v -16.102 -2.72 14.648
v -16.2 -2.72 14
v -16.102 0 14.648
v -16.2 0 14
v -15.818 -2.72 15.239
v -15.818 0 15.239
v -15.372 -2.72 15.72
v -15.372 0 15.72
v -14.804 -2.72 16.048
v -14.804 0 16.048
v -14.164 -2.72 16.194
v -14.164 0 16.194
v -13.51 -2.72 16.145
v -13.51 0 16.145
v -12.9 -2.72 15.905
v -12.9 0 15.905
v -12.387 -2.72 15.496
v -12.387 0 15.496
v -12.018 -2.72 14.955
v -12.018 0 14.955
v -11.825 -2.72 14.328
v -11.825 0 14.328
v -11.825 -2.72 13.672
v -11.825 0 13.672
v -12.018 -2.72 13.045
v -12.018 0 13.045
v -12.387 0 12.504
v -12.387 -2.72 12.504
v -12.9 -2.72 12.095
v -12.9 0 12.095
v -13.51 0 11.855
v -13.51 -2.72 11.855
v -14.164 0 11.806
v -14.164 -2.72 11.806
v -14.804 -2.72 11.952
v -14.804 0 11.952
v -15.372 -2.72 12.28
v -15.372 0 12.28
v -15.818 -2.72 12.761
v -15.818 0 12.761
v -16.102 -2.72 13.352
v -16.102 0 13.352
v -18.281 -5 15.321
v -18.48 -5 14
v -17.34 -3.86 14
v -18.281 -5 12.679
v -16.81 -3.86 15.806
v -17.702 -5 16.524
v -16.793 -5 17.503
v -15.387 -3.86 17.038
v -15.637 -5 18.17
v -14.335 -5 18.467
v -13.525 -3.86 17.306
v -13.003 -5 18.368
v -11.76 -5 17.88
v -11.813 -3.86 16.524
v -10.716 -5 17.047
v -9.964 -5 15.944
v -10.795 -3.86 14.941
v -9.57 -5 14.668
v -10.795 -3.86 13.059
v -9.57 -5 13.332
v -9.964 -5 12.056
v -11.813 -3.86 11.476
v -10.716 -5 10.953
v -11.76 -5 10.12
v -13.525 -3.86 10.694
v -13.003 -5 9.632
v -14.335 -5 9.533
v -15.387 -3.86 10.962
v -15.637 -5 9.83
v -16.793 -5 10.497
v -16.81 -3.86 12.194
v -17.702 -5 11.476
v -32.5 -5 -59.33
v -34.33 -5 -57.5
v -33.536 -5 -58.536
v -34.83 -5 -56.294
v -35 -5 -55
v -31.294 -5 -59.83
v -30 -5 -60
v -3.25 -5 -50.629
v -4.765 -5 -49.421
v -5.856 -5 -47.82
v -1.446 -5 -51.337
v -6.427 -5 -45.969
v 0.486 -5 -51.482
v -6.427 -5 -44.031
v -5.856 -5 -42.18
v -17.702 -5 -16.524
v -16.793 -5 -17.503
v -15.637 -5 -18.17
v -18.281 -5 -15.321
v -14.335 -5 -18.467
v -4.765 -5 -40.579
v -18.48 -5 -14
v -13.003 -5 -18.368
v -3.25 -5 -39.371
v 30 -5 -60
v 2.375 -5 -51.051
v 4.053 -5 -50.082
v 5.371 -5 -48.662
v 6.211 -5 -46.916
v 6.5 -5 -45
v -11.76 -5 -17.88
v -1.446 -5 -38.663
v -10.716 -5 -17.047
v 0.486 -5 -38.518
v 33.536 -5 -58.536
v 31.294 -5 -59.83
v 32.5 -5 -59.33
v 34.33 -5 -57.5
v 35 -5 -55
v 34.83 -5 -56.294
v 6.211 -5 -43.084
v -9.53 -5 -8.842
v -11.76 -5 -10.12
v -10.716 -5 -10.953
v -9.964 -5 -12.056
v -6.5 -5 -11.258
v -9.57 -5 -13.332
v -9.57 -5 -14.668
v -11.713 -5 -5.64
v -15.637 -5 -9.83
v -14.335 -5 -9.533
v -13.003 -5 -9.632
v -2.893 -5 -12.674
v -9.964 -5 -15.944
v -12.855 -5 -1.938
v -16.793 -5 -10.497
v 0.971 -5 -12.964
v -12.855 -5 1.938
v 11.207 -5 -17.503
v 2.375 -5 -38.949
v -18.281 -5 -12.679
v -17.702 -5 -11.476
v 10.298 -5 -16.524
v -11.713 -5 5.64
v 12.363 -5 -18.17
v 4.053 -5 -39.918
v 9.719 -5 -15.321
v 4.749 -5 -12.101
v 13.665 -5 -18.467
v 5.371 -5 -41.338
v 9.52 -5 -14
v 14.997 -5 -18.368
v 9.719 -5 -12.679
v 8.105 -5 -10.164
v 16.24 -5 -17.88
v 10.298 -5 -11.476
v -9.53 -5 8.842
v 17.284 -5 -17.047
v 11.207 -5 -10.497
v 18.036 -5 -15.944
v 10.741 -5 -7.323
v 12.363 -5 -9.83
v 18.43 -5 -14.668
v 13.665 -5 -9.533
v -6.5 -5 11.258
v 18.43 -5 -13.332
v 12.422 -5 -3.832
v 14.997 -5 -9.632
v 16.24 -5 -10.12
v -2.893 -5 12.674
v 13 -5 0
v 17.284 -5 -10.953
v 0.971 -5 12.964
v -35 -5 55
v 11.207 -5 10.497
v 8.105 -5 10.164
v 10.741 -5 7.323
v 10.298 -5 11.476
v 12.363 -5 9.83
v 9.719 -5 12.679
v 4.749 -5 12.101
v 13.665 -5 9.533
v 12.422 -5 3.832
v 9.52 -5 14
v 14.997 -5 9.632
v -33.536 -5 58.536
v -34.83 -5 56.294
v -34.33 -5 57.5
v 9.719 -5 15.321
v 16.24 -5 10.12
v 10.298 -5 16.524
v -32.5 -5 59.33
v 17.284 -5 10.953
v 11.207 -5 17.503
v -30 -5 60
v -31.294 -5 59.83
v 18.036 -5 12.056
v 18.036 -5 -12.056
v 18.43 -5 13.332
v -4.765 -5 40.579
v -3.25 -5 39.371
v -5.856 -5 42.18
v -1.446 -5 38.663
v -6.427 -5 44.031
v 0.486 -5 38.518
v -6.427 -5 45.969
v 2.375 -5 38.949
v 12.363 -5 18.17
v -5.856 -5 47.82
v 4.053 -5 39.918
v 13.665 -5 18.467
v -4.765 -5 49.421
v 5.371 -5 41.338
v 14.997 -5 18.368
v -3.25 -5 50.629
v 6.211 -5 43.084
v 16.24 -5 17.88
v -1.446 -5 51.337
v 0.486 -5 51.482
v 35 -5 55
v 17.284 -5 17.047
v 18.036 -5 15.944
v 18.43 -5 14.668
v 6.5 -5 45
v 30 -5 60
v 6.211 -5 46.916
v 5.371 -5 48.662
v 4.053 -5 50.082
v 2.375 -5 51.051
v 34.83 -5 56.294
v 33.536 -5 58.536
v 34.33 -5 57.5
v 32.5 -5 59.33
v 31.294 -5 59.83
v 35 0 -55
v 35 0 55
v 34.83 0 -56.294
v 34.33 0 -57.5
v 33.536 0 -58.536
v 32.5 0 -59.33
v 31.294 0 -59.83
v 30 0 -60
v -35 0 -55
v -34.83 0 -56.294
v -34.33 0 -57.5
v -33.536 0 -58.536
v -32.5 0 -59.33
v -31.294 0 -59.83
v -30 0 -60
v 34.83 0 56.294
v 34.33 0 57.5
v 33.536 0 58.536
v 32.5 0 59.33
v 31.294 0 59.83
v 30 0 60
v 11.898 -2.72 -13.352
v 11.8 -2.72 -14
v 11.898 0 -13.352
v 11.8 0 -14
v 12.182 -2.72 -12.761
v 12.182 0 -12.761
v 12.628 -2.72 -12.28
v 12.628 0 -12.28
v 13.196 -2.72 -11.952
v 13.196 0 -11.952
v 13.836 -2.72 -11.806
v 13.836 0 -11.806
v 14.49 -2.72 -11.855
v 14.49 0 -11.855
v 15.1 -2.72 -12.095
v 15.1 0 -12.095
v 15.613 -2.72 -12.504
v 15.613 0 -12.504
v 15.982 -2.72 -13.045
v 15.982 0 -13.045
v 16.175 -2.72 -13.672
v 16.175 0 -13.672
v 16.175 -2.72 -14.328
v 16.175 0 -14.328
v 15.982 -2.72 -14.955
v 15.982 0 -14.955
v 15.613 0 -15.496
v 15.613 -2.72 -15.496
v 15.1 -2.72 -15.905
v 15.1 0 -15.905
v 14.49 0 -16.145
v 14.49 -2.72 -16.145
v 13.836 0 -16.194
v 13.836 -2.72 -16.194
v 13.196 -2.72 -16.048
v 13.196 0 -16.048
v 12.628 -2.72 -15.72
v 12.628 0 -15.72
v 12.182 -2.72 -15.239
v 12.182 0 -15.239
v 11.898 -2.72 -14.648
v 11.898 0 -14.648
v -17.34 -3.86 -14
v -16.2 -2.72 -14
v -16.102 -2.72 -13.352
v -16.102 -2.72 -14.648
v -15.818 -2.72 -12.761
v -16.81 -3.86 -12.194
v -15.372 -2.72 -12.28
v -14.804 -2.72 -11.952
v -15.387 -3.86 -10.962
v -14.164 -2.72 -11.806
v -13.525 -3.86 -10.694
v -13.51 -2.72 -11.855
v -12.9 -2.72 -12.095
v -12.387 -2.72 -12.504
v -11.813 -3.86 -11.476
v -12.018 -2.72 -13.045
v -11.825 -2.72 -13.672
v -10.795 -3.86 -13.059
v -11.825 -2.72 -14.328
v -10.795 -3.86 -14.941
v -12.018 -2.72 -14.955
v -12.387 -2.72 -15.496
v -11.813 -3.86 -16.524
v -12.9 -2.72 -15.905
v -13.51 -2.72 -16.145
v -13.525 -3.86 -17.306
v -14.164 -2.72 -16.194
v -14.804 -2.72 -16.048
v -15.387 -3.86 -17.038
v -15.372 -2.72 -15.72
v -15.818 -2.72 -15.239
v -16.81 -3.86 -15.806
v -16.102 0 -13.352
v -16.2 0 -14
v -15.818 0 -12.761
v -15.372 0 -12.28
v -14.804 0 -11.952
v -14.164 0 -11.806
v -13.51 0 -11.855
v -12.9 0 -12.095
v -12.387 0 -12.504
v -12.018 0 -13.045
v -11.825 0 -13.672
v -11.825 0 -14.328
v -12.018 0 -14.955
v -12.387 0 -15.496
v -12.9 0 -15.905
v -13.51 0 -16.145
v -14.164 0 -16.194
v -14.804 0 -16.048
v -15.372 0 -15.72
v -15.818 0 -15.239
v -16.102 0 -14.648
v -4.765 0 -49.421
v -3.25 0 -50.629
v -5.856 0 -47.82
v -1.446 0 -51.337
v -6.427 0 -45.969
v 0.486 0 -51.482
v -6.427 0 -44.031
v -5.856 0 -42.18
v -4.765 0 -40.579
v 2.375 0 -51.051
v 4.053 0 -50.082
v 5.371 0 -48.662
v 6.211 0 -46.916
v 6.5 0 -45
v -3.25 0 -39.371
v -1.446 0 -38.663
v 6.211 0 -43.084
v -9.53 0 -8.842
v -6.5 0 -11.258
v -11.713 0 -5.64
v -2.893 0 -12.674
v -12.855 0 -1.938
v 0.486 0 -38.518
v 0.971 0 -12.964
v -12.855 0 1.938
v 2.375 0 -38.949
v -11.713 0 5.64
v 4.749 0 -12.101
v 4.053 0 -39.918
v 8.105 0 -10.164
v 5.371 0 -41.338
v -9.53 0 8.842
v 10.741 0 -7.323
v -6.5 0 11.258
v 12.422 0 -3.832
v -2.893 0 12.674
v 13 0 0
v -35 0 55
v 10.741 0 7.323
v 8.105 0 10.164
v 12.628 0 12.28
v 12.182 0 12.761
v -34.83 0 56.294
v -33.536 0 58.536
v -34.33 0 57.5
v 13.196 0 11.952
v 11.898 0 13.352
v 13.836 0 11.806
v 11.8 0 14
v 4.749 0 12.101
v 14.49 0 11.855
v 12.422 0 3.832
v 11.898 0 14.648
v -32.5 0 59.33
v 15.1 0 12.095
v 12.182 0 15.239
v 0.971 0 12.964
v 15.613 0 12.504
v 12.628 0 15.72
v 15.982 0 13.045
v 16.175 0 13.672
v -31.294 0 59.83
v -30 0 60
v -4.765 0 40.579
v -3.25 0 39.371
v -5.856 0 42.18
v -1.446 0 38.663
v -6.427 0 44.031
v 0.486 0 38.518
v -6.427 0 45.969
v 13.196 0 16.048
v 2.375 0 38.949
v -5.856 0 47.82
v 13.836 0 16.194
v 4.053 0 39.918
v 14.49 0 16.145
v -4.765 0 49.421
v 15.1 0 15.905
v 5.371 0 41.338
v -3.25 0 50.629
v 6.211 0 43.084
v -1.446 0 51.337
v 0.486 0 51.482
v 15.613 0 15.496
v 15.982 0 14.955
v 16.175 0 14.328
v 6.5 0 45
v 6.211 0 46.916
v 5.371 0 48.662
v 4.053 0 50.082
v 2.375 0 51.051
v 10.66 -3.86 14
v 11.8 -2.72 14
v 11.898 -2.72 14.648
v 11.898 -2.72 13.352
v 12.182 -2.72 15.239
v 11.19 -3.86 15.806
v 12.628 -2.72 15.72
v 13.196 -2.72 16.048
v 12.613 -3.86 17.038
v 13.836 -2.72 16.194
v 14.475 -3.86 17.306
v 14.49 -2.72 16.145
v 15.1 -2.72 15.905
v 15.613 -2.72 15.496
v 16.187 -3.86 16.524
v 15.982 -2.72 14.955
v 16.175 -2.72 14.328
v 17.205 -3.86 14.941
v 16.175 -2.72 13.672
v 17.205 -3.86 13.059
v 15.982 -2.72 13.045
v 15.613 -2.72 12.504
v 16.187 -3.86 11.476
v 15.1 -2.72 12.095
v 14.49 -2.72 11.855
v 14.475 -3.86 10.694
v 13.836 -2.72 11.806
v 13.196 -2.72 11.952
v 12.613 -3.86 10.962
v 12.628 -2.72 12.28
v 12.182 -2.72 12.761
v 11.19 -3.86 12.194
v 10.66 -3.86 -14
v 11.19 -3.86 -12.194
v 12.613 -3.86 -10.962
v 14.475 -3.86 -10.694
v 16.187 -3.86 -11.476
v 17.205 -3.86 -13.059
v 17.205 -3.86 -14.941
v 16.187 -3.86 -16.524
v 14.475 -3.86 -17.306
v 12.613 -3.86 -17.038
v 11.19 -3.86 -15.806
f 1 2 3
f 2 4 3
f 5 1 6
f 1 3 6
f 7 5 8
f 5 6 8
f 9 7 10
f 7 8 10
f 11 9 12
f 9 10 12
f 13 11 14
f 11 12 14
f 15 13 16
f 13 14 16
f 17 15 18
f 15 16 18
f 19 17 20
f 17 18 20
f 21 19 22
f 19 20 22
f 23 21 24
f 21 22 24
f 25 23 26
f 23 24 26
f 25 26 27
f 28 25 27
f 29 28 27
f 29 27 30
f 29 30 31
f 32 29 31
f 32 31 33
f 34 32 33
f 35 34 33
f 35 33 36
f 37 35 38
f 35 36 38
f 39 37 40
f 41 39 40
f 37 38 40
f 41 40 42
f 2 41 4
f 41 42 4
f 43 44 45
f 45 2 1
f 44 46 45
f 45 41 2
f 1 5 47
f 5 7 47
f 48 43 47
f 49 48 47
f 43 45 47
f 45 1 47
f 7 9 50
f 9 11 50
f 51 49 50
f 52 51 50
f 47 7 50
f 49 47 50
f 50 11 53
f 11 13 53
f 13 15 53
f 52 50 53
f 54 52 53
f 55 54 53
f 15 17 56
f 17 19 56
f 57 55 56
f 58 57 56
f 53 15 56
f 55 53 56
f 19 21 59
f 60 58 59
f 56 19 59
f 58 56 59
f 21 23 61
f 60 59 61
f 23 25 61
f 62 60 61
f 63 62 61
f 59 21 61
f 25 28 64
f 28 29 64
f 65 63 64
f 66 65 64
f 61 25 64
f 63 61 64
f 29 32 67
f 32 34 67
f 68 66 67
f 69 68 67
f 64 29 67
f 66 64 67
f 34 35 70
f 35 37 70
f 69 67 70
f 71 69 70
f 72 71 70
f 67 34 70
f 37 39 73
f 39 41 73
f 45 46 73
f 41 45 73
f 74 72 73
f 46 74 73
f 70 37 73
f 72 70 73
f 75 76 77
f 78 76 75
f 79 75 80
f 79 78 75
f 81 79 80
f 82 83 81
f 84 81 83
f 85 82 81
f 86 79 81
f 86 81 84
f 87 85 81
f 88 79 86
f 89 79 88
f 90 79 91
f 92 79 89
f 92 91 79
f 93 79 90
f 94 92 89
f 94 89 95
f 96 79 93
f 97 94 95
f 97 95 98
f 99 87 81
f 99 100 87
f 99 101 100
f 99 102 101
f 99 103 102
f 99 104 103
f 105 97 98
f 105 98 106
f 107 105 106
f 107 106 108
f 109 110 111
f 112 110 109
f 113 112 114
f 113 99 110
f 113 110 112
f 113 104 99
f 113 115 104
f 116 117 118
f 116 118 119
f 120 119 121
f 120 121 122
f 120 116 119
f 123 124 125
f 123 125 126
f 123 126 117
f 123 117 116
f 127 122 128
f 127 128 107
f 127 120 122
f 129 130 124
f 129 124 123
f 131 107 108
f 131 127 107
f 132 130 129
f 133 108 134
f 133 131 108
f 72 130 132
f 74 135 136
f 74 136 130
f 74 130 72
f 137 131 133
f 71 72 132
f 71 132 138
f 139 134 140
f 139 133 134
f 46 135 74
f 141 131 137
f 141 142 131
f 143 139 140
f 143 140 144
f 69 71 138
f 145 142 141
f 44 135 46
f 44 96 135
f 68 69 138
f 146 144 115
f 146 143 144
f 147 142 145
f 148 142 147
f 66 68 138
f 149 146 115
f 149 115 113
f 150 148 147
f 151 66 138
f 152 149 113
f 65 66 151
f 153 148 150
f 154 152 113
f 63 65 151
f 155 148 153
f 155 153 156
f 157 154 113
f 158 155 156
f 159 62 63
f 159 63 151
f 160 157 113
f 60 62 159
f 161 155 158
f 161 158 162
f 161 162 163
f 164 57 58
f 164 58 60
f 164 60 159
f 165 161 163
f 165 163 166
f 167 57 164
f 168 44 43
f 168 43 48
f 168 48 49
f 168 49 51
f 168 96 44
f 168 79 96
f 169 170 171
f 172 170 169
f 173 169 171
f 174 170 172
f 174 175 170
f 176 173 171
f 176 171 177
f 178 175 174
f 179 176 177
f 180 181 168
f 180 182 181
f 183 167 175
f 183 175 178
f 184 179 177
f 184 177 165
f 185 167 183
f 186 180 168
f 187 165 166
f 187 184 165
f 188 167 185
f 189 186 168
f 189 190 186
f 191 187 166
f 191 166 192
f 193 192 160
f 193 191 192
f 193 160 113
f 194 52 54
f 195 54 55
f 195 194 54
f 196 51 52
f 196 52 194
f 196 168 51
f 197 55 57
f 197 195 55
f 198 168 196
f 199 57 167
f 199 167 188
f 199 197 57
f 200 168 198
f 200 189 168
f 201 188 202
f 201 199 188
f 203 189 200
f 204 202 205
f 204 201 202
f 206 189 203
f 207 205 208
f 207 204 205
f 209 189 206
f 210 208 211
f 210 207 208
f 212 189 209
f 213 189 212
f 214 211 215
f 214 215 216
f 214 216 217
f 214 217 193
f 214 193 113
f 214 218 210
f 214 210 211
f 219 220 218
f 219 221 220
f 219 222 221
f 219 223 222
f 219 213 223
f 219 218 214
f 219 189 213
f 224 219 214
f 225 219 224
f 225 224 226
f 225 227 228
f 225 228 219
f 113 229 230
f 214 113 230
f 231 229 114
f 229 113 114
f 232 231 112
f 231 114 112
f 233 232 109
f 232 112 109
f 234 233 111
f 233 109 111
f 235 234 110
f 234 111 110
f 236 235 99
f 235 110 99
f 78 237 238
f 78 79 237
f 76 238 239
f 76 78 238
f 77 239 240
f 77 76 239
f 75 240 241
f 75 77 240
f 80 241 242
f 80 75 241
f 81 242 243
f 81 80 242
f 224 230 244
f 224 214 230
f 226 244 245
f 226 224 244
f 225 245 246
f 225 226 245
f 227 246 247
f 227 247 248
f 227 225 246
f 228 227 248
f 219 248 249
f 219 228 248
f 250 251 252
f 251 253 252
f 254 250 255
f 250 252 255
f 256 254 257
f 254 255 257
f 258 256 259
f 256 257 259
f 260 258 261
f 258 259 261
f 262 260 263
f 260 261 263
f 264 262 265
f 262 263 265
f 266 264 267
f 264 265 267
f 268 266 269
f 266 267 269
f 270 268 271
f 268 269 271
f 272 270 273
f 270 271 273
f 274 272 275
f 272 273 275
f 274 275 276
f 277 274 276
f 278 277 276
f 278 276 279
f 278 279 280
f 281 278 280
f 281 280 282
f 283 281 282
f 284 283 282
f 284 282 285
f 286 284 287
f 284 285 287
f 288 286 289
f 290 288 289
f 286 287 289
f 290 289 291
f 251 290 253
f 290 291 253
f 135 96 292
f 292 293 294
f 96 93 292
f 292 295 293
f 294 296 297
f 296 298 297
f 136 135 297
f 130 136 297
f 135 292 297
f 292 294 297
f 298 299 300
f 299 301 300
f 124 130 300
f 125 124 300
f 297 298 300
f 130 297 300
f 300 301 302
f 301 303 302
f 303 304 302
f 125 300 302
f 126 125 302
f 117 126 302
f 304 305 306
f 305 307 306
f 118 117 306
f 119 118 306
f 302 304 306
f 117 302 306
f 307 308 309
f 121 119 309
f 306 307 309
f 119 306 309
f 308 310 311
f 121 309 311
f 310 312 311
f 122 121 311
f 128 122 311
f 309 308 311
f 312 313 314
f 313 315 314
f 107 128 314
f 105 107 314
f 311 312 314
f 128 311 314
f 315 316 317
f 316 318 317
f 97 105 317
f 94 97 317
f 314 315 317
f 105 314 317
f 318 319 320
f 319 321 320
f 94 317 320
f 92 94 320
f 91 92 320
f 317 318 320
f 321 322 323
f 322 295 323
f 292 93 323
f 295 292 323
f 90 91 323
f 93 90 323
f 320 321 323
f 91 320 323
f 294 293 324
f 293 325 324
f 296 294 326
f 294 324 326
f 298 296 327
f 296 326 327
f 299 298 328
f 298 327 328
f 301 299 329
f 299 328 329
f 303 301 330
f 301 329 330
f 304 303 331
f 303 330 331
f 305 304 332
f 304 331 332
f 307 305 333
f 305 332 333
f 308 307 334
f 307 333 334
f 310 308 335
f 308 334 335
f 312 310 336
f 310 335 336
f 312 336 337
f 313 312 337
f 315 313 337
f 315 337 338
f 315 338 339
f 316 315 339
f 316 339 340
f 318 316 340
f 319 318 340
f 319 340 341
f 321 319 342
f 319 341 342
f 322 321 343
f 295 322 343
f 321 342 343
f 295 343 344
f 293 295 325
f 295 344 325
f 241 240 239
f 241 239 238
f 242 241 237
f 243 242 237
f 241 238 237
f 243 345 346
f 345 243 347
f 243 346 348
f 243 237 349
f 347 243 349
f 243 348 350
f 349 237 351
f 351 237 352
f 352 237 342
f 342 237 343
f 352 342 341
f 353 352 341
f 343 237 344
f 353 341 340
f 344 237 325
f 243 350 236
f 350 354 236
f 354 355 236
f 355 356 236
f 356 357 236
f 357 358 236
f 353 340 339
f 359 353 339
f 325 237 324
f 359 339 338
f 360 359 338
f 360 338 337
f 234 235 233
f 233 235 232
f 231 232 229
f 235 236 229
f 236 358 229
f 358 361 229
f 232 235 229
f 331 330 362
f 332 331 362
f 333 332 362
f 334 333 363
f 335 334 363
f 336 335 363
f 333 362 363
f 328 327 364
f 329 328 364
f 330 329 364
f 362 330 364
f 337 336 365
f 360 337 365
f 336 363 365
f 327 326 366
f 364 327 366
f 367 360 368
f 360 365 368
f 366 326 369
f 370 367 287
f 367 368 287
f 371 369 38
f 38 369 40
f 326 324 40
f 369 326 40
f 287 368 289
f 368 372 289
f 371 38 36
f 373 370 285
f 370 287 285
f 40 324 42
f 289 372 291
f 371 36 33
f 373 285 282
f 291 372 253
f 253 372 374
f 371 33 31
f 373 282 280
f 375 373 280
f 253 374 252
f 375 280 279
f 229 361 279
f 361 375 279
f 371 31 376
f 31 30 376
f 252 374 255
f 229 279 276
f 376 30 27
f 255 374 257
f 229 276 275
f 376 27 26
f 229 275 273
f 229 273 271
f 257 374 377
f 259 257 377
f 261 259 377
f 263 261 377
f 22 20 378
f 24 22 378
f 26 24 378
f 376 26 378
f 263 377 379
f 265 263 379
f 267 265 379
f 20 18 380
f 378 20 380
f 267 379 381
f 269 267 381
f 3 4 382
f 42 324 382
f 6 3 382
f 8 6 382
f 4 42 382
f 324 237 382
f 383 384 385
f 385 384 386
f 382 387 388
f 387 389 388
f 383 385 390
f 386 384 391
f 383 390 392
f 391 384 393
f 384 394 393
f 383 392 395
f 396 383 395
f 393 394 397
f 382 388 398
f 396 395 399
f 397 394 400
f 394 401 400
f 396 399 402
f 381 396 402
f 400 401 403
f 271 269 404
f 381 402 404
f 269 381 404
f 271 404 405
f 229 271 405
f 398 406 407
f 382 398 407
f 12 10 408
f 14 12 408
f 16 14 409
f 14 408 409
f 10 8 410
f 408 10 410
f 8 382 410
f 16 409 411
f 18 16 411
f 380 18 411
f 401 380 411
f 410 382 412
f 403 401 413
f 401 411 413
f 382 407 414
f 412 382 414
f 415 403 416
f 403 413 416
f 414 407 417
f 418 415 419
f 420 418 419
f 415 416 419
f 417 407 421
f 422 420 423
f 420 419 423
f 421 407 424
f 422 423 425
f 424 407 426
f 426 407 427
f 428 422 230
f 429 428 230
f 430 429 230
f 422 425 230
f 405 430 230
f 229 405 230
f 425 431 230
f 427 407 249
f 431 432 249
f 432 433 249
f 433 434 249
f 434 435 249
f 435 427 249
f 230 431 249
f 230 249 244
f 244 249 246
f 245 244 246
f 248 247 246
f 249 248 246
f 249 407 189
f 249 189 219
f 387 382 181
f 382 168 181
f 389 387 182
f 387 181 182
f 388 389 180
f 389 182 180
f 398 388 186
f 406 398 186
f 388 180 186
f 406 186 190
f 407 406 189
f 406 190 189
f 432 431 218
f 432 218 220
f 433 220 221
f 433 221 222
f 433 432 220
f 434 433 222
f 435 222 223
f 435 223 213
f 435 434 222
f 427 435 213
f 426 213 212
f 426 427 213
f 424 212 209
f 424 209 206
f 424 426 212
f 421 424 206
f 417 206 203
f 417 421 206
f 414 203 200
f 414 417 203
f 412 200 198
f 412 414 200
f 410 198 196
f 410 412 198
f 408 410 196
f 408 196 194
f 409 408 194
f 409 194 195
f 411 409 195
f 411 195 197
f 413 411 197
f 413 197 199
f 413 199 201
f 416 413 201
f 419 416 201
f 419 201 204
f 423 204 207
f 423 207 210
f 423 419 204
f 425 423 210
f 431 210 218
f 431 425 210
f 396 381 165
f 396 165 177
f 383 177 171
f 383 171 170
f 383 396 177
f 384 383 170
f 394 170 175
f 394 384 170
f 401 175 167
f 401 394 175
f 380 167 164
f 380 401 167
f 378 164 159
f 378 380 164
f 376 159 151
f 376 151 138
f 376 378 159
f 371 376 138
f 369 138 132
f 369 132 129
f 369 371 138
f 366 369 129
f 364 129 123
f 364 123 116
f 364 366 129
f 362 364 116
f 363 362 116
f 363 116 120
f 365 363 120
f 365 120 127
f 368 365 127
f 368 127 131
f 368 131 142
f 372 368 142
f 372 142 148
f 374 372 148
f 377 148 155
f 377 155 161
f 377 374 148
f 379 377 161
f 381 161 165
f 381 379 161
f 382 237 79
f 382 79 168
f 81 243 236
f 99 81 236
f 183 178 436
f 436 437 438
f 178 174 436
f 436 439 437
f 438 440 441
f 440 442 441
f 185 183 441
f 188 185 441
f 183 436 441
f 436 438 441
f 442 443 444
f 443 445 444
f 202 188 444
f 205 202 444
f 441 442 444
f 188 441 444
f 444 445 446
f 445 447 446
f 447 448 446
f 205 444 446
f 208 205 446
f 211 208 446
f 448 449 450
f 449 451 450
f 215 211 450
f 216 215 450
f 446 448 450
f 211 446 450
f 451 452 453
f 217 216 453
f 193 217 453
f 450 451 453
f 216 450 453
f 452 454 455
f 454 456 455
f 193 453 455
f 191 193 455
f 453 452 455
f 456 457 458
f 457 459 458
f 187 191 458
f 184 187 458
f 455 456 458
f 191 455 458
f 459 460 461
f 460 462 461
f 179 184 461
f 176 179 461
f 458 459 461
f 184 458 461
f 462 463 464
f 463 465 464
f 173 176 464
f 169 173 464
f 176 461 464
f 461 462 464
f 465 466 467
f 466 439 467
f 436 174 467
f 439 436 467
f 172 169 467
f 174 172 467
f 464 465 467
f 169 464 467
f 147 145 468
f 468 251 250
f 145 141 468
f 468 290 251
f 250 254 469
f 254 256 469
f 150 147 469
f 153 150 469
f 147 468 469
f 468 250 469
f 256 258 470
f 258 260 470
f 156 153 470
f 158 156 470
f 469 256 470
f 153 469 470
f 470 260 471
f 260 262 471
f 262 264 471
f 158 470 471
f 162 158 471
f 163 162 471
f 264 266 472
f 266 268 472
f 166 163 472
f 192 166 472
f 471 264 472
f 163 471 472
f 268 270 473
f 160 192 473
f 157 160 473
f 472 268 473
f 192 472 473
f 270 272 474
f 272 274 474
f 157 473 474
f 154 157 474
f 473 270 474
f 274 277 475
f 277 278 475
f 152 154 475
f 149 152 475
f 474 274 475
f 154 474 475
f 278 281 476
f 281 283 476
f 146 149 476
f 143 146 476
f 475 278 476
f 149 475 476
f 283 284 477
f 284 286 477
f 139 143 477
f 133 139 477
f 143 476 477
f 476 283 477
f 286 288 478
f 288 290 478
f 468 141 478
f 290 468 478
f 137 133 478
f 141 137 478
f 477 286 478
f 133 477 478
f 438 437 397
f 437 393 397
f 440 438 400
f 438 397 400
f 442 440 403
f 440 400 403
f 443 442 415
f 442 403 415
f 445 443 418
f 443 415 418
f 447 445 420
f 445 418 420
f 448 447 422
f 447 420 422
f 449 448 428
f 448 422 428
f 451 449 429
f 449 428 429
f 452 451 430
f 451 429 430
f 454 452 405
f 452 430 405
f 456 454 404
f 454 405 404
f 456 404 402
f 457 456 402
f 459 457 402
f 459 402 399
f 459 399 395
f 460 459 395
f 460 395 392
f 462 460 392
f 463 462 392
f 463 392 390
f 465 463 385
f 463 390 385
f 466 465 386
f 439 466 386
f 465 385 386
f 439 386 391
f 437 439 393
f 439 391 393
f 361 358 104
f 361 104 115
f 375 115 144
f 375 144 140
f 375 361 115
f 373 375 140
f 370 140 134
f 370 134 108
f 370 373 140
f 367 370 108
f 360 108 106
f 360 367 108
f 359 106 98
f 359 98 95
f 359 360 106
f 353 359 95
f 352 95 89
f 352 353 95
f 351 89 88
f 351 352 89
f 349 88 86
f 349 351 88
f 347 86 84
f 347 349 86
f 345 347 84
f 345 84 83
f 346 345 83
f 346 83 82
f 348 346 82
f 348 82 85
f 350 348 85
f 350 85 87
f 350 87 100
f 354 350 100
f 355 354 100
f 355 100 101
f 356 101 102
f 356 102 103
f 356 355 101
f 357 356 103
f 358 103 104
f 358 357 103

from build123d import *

# Parameters (mm, degrees)
F0_W           = 70
F0_H           = 120
F0_R           = 6.5
F0_R_2         = 13
F1_DEPTH       = 5
F3_D           = 4.4
F3_DEPTH       = 10
F3_CSINK_D     = 8.96
F3_CSINK_ANGLE = 90
F3_TIP         = 1.3218933619
F4_R           = 5


# Not quite as in the source:
# - a feature names something its author has since deleted; it is built from what else it names


with BuildPart() as f1:
    # F0 (on Front) → F1 (new body)
    with BuildSketch(Plane.XZ):
        Rectangle(F0_W, F0_H)
        with Locations((0, -45)):
            Circle(F0_R, mode=Mode.SUBTRACT)
        Circle(F0_R_2, mode=Mode.SUBTRACT)
        with Locations((0, 45)):
            Circle(F0_R, mode=Mode.SUBTRACT)
    extrude(amount=F1_DEPTH)

    # F3
    with Locations(Plane.XZ.offset(5)):
        with Locations((14, 14), (-14, 14), (-14, -14), (14, -14)):
            CounterSinkHole(F3_D / 2, F3_CSINK_D / 2, depth=F3_DEPTH, counter_sink_angle=F3_CSINK_ANGLE)
            with Locations((0, 0, -(F3_DEPTH + F3_TIP / 2))):  # 118° drill point
                Cone(0, F3_D / 2, F3_TIP, mode=Mode.SUBTRACT)

    # F4
    f4_edges = [f1.edges().sort_by_distance(p)[0] for p in [
        (35, -2.5, 60),
        (35, -2.5, -60),
        (-35, -2.5, -60),
        (-35, -2.5, 60),
    ]]
    fillet(f4_edges, radius=F4_R)


solid = f1.part
